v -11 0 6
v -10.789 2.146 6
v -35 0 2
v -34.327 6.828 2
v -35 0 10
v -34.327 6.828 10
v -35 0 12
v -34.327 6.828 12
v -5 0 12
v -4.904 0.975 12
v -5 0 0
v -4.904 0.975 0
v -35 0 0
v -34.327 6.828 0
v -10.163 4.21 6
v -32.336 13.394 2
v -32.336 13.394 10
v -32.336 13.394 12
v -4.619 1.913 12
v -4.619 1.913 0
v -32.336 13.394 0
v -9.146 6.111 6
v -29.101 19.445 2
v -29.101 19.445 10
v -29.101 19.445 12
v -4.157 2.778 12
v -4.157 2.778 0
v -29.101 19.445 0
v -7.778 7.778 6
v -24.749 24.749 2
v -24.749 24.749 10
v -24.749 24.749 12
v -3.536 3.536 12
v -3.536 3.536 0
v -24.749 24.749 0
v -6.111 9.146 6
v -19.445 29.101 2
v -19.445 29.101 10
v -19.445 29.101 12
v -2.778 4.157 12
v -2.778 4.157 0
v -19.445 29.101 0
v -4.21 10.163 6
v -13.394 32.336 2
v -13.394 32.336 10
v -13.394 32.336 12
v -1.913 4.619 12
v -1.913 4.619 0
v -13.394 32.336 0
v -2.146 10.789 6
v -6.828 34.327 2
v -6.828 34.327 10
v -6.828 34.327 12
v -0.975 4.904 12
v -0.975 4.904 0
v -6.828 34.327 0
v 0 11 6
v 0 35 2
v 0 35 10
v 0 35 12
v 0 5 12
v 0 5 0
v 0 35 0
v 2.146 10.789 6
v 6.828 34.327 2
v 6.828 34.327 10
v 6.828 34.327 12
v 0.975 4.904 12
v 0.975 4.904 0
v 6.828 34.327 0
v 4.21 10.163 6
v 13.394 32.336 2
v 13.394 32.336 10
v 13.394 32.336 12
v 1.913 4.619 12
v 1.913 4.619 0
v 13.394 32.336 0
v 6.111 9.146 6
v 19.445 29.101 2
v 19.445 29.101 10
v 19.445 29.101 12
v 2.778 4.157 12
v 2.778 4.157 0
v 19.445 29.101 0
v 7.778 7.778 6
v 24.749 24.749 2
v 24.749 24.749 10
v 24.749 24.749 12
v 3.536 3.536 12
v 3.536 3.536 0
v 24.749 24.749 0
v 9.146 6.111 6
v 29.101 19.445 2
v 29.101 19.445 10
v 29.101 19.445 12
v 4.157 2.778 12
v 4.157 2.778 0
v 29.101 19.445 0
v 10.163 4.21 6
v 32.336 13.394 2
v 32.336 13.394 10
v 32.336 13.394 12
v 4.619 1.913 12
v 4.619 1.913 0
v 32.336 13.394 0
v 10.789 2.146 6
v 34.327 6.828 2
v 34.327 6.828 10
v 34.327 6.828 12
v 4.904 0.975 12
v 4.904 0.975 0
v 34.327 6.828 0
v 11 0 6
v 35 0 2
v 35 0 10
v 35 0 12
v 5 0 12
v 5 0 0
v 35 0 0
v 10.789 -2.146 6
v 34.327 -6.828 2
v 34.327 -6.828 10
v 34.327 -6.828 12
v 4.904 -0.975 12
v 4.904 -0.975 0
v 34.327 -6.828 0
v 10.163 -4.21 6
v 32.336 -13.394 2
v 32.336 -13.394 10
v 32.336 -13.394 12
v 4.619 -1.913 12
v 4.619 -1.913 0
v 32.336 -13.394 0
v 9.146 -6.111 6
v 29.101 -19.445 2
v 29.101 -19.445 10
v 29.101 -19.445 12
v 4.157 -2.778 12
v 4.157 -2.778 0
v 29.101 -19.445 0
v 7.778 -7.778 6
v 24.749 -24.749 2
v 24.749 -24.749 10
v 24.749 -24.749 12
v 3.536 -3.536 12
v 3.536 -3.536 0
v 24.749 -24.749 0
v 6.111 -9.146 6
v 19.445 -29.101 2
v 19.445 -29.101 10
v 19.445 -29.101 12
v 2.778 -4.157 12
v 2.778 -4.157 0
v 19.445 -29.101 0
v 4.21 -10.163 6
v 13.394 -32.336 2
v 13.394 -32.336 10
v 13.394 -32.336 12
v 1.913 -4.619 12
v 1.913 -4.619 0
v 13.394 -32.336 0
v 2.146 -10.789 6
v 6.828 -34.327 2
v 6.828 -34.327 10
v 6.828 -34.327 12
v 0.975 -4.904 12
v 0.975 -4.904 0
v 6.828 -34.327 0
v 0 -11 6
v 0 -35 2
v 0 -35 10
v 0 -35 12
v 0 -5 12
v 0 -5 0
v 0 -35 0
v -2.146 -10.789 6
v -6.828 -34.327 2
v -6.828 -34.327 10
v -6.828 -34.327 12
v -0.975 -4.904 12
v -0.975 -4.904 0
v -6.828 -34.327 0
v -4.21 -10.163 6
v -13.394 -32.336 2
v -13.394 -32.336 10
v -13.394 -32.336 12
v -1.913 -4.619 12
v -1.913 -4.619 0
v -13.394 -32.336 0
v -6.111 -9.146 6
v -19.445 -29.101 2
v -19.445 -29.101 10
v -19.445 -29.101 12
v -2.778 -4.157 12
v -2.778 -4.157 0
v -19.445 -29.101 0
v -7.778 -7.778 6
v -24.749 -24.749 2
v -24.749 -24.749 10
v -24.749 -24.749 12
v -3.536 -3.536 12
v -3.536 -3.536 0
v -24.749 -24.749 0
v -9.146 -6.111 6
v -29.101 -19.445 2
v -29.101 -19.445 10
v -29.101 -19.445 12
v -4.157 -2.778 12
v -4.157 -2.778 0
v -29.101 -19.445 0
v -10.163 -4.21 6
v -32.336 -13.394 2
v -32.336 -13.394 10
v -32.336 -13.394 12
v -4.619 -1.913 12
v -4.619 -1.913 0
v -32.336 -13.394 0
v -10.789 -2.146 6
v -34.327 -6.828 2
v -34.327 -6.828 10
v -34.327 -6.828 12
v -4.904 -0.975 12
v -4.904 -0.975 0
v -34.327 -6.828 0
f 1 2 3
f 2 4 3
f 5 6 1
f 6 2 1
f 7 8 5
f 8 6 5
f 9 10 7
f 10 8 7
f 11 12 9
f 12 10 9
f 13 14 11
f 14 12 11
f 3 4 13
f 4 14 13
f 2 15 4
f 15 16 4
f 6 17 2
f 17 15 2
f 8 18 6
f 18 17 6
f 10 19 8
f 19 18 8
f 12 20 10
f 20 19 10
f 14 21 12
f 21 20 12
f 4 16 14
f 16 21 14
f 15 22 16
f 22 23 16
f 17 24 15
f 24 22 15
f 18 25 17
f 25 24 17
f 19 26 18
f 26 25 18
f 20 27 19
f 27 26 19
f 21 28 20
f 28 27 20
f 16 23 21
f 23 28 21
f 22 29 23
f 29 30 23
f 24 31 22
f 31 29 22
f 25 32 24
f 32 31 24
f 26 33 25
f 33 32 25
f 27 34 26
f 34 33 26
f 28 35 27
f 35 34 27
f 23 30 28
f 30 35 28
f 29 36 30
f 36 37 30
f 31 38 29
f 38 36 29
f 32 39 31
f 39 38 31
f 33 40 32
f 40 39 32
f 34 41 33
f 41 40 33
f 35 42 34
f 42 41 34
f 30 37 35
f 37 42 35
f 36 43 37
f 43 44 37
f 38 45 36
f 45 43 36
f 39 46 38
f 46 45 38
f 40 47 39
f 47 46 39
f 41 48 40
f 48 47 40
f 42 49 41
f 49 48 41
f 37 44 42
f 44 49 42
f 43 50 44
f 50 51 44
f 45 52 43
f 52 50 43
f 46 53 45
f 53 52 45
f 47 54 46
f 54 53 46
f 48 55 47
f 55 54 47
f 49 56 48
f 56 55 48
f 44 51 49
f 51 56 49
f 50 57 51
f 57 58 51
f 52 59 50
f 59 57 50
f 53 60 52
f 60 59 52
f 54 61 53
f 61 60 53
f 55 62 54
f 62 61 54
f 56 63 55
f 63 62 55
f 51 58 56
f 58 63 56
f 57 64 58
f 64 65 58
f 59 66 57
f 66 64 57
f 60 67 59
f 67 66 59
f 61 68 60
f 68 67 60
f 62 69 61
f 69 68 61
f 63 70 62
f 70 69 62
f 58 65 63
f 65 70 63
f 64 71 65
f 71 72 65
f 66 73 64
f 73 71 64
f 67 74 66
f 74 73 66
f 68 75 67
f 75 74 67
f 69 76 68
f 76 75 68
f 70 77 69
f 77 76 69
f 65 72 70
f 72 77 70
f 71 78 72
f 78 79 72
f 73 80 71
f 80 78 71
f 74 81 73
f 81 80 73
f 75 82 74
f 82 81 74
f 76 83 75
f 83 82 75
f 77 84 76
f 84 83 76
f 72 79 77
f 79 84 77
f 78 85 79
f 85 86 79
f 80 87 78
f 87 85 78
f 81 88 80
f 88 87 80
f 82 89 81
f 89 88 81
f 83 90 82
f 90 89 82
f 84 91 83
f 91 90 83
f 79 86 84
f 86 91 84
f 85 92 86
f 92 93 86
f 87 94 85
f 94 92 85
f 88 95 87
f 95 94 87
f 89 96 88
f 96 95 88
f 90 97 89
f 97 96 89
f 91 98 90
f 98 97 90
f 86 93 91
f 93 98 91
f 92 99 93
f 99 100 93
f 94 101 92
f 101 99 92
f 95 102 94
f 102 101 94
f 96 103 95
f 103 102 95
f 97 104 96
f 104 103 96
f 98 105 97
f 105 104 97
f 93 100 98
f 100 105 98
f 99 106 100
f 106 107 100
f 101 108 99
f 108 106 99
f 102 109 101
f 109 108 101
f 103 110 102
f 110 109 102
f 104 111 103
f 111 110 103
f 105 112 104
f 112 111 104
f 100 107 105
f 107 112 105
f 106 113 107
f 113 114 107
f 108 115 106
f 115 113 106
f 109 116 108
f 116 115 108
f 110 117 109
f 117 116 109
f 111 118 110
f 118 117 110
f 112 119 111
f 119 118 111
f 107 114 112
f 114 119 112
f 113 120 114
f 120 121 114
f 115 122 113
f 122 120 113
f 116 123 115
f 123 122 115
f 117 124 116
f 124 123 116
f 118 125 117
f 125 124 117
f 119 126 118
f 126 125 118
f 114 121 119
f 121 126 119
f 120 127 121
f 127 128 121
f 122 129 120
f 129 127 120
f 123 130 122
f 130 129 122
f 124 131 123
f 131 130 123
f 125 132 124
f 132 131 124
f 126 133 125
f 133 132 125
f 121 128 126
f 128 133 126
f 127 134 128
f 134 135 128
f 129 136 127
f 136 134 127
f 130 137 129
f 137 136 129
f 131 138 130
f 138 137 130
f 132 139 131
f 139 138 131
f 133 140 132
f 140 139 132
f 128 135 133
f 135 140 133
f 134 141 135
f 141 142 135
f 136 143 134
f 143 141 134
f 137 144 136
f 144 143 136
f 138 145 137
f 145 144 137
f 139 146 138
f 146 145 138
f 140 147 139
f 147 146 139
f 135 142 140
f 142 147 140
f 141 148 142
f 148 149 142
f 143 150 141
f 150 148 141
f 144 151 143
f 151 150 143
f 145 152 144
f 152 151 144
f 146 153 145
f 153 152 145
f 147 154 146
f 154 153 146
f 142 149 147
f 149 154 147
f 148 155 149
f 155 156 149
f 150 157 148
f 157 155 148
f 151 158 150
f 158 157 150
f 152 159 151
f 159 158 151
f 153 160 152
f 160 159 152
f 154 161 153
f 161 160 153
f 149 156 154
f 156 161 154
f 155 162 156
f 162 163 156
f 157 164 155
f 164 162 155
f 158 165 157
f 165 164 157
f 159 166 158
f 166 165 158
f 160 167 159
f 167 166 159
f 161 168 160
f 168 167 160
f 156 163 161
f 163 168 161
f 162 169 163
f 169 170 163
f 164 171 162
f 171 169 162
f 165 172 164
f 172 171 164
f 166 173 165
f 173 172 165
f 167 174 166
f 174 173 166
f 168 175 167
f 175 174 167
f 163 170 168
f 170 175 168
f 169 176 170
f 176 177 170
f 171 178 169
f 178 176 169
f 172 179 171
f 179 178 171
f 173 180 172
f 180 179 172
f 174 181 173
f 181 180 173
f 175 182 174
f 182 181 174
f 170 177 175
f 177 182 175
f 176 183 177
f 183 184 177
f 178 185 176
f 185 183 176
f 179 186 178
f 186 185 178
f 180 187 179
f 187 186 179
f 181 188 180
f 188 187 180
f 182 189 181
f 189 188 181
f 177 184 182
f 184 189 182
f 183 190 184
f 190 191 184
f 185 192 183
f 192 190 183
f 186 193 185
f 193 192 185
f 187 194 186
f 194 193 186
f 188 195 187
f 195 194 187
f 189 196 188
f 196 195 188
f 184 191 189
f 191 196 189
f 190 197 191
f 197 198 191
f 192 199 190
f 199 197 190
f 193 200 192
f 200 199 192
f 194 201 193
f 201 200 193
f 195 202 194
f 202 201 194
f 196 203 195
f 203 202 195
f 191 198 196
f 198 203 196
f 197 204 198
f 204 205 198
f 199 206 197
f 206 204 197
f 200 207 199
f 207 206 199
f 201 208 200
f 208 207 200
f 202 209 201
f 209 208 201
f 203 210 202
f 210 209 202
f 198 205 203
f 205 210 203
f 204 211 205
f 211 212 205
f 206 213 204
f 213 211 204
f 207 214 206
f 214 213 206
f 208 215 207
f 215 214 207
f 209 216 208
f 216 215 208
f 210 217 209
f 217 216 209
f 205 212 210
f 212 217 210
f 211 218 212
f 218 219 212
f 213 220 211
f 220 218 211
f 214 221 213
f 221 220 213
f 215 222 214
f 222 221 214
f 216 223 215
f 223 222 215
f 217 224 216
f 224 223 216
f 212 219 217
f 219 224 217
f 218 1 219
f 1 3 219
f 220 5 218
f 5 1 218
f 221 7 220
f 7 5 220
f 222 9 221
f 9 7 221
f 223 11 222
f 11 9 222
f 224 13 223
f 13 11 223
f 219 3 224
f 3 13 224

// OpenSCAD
$fn = 32;

// ----------------------------------------------------------------------
// Revolved part: V-groove pulley R35
// ----------------------------------------------------------------------

// --- parameters (mm) ---
bore_r = 5;               // bore radius
rim_r = 35;               // rim radius
rim_t = 12;               // rim width
groove_r = 11;            // groove root radius
groove_w = 4;             // groove half width
revolve_angle = 360;      // revolve sweep, degrees

bore_d = 2 * bore_r;
rim_d = 2 * rim_r;
groove_d = 2 * groove_r;

profile = [[5, 0], [35, 0], [35, 2], [11, 6], [35, 10], [35, 12], [5, 12]];  // primary outline, 7 points, counter clockwise

// --- the one profile operation ---
rotate_extrude(angle = revolve_angle) polygon(points = profile);
